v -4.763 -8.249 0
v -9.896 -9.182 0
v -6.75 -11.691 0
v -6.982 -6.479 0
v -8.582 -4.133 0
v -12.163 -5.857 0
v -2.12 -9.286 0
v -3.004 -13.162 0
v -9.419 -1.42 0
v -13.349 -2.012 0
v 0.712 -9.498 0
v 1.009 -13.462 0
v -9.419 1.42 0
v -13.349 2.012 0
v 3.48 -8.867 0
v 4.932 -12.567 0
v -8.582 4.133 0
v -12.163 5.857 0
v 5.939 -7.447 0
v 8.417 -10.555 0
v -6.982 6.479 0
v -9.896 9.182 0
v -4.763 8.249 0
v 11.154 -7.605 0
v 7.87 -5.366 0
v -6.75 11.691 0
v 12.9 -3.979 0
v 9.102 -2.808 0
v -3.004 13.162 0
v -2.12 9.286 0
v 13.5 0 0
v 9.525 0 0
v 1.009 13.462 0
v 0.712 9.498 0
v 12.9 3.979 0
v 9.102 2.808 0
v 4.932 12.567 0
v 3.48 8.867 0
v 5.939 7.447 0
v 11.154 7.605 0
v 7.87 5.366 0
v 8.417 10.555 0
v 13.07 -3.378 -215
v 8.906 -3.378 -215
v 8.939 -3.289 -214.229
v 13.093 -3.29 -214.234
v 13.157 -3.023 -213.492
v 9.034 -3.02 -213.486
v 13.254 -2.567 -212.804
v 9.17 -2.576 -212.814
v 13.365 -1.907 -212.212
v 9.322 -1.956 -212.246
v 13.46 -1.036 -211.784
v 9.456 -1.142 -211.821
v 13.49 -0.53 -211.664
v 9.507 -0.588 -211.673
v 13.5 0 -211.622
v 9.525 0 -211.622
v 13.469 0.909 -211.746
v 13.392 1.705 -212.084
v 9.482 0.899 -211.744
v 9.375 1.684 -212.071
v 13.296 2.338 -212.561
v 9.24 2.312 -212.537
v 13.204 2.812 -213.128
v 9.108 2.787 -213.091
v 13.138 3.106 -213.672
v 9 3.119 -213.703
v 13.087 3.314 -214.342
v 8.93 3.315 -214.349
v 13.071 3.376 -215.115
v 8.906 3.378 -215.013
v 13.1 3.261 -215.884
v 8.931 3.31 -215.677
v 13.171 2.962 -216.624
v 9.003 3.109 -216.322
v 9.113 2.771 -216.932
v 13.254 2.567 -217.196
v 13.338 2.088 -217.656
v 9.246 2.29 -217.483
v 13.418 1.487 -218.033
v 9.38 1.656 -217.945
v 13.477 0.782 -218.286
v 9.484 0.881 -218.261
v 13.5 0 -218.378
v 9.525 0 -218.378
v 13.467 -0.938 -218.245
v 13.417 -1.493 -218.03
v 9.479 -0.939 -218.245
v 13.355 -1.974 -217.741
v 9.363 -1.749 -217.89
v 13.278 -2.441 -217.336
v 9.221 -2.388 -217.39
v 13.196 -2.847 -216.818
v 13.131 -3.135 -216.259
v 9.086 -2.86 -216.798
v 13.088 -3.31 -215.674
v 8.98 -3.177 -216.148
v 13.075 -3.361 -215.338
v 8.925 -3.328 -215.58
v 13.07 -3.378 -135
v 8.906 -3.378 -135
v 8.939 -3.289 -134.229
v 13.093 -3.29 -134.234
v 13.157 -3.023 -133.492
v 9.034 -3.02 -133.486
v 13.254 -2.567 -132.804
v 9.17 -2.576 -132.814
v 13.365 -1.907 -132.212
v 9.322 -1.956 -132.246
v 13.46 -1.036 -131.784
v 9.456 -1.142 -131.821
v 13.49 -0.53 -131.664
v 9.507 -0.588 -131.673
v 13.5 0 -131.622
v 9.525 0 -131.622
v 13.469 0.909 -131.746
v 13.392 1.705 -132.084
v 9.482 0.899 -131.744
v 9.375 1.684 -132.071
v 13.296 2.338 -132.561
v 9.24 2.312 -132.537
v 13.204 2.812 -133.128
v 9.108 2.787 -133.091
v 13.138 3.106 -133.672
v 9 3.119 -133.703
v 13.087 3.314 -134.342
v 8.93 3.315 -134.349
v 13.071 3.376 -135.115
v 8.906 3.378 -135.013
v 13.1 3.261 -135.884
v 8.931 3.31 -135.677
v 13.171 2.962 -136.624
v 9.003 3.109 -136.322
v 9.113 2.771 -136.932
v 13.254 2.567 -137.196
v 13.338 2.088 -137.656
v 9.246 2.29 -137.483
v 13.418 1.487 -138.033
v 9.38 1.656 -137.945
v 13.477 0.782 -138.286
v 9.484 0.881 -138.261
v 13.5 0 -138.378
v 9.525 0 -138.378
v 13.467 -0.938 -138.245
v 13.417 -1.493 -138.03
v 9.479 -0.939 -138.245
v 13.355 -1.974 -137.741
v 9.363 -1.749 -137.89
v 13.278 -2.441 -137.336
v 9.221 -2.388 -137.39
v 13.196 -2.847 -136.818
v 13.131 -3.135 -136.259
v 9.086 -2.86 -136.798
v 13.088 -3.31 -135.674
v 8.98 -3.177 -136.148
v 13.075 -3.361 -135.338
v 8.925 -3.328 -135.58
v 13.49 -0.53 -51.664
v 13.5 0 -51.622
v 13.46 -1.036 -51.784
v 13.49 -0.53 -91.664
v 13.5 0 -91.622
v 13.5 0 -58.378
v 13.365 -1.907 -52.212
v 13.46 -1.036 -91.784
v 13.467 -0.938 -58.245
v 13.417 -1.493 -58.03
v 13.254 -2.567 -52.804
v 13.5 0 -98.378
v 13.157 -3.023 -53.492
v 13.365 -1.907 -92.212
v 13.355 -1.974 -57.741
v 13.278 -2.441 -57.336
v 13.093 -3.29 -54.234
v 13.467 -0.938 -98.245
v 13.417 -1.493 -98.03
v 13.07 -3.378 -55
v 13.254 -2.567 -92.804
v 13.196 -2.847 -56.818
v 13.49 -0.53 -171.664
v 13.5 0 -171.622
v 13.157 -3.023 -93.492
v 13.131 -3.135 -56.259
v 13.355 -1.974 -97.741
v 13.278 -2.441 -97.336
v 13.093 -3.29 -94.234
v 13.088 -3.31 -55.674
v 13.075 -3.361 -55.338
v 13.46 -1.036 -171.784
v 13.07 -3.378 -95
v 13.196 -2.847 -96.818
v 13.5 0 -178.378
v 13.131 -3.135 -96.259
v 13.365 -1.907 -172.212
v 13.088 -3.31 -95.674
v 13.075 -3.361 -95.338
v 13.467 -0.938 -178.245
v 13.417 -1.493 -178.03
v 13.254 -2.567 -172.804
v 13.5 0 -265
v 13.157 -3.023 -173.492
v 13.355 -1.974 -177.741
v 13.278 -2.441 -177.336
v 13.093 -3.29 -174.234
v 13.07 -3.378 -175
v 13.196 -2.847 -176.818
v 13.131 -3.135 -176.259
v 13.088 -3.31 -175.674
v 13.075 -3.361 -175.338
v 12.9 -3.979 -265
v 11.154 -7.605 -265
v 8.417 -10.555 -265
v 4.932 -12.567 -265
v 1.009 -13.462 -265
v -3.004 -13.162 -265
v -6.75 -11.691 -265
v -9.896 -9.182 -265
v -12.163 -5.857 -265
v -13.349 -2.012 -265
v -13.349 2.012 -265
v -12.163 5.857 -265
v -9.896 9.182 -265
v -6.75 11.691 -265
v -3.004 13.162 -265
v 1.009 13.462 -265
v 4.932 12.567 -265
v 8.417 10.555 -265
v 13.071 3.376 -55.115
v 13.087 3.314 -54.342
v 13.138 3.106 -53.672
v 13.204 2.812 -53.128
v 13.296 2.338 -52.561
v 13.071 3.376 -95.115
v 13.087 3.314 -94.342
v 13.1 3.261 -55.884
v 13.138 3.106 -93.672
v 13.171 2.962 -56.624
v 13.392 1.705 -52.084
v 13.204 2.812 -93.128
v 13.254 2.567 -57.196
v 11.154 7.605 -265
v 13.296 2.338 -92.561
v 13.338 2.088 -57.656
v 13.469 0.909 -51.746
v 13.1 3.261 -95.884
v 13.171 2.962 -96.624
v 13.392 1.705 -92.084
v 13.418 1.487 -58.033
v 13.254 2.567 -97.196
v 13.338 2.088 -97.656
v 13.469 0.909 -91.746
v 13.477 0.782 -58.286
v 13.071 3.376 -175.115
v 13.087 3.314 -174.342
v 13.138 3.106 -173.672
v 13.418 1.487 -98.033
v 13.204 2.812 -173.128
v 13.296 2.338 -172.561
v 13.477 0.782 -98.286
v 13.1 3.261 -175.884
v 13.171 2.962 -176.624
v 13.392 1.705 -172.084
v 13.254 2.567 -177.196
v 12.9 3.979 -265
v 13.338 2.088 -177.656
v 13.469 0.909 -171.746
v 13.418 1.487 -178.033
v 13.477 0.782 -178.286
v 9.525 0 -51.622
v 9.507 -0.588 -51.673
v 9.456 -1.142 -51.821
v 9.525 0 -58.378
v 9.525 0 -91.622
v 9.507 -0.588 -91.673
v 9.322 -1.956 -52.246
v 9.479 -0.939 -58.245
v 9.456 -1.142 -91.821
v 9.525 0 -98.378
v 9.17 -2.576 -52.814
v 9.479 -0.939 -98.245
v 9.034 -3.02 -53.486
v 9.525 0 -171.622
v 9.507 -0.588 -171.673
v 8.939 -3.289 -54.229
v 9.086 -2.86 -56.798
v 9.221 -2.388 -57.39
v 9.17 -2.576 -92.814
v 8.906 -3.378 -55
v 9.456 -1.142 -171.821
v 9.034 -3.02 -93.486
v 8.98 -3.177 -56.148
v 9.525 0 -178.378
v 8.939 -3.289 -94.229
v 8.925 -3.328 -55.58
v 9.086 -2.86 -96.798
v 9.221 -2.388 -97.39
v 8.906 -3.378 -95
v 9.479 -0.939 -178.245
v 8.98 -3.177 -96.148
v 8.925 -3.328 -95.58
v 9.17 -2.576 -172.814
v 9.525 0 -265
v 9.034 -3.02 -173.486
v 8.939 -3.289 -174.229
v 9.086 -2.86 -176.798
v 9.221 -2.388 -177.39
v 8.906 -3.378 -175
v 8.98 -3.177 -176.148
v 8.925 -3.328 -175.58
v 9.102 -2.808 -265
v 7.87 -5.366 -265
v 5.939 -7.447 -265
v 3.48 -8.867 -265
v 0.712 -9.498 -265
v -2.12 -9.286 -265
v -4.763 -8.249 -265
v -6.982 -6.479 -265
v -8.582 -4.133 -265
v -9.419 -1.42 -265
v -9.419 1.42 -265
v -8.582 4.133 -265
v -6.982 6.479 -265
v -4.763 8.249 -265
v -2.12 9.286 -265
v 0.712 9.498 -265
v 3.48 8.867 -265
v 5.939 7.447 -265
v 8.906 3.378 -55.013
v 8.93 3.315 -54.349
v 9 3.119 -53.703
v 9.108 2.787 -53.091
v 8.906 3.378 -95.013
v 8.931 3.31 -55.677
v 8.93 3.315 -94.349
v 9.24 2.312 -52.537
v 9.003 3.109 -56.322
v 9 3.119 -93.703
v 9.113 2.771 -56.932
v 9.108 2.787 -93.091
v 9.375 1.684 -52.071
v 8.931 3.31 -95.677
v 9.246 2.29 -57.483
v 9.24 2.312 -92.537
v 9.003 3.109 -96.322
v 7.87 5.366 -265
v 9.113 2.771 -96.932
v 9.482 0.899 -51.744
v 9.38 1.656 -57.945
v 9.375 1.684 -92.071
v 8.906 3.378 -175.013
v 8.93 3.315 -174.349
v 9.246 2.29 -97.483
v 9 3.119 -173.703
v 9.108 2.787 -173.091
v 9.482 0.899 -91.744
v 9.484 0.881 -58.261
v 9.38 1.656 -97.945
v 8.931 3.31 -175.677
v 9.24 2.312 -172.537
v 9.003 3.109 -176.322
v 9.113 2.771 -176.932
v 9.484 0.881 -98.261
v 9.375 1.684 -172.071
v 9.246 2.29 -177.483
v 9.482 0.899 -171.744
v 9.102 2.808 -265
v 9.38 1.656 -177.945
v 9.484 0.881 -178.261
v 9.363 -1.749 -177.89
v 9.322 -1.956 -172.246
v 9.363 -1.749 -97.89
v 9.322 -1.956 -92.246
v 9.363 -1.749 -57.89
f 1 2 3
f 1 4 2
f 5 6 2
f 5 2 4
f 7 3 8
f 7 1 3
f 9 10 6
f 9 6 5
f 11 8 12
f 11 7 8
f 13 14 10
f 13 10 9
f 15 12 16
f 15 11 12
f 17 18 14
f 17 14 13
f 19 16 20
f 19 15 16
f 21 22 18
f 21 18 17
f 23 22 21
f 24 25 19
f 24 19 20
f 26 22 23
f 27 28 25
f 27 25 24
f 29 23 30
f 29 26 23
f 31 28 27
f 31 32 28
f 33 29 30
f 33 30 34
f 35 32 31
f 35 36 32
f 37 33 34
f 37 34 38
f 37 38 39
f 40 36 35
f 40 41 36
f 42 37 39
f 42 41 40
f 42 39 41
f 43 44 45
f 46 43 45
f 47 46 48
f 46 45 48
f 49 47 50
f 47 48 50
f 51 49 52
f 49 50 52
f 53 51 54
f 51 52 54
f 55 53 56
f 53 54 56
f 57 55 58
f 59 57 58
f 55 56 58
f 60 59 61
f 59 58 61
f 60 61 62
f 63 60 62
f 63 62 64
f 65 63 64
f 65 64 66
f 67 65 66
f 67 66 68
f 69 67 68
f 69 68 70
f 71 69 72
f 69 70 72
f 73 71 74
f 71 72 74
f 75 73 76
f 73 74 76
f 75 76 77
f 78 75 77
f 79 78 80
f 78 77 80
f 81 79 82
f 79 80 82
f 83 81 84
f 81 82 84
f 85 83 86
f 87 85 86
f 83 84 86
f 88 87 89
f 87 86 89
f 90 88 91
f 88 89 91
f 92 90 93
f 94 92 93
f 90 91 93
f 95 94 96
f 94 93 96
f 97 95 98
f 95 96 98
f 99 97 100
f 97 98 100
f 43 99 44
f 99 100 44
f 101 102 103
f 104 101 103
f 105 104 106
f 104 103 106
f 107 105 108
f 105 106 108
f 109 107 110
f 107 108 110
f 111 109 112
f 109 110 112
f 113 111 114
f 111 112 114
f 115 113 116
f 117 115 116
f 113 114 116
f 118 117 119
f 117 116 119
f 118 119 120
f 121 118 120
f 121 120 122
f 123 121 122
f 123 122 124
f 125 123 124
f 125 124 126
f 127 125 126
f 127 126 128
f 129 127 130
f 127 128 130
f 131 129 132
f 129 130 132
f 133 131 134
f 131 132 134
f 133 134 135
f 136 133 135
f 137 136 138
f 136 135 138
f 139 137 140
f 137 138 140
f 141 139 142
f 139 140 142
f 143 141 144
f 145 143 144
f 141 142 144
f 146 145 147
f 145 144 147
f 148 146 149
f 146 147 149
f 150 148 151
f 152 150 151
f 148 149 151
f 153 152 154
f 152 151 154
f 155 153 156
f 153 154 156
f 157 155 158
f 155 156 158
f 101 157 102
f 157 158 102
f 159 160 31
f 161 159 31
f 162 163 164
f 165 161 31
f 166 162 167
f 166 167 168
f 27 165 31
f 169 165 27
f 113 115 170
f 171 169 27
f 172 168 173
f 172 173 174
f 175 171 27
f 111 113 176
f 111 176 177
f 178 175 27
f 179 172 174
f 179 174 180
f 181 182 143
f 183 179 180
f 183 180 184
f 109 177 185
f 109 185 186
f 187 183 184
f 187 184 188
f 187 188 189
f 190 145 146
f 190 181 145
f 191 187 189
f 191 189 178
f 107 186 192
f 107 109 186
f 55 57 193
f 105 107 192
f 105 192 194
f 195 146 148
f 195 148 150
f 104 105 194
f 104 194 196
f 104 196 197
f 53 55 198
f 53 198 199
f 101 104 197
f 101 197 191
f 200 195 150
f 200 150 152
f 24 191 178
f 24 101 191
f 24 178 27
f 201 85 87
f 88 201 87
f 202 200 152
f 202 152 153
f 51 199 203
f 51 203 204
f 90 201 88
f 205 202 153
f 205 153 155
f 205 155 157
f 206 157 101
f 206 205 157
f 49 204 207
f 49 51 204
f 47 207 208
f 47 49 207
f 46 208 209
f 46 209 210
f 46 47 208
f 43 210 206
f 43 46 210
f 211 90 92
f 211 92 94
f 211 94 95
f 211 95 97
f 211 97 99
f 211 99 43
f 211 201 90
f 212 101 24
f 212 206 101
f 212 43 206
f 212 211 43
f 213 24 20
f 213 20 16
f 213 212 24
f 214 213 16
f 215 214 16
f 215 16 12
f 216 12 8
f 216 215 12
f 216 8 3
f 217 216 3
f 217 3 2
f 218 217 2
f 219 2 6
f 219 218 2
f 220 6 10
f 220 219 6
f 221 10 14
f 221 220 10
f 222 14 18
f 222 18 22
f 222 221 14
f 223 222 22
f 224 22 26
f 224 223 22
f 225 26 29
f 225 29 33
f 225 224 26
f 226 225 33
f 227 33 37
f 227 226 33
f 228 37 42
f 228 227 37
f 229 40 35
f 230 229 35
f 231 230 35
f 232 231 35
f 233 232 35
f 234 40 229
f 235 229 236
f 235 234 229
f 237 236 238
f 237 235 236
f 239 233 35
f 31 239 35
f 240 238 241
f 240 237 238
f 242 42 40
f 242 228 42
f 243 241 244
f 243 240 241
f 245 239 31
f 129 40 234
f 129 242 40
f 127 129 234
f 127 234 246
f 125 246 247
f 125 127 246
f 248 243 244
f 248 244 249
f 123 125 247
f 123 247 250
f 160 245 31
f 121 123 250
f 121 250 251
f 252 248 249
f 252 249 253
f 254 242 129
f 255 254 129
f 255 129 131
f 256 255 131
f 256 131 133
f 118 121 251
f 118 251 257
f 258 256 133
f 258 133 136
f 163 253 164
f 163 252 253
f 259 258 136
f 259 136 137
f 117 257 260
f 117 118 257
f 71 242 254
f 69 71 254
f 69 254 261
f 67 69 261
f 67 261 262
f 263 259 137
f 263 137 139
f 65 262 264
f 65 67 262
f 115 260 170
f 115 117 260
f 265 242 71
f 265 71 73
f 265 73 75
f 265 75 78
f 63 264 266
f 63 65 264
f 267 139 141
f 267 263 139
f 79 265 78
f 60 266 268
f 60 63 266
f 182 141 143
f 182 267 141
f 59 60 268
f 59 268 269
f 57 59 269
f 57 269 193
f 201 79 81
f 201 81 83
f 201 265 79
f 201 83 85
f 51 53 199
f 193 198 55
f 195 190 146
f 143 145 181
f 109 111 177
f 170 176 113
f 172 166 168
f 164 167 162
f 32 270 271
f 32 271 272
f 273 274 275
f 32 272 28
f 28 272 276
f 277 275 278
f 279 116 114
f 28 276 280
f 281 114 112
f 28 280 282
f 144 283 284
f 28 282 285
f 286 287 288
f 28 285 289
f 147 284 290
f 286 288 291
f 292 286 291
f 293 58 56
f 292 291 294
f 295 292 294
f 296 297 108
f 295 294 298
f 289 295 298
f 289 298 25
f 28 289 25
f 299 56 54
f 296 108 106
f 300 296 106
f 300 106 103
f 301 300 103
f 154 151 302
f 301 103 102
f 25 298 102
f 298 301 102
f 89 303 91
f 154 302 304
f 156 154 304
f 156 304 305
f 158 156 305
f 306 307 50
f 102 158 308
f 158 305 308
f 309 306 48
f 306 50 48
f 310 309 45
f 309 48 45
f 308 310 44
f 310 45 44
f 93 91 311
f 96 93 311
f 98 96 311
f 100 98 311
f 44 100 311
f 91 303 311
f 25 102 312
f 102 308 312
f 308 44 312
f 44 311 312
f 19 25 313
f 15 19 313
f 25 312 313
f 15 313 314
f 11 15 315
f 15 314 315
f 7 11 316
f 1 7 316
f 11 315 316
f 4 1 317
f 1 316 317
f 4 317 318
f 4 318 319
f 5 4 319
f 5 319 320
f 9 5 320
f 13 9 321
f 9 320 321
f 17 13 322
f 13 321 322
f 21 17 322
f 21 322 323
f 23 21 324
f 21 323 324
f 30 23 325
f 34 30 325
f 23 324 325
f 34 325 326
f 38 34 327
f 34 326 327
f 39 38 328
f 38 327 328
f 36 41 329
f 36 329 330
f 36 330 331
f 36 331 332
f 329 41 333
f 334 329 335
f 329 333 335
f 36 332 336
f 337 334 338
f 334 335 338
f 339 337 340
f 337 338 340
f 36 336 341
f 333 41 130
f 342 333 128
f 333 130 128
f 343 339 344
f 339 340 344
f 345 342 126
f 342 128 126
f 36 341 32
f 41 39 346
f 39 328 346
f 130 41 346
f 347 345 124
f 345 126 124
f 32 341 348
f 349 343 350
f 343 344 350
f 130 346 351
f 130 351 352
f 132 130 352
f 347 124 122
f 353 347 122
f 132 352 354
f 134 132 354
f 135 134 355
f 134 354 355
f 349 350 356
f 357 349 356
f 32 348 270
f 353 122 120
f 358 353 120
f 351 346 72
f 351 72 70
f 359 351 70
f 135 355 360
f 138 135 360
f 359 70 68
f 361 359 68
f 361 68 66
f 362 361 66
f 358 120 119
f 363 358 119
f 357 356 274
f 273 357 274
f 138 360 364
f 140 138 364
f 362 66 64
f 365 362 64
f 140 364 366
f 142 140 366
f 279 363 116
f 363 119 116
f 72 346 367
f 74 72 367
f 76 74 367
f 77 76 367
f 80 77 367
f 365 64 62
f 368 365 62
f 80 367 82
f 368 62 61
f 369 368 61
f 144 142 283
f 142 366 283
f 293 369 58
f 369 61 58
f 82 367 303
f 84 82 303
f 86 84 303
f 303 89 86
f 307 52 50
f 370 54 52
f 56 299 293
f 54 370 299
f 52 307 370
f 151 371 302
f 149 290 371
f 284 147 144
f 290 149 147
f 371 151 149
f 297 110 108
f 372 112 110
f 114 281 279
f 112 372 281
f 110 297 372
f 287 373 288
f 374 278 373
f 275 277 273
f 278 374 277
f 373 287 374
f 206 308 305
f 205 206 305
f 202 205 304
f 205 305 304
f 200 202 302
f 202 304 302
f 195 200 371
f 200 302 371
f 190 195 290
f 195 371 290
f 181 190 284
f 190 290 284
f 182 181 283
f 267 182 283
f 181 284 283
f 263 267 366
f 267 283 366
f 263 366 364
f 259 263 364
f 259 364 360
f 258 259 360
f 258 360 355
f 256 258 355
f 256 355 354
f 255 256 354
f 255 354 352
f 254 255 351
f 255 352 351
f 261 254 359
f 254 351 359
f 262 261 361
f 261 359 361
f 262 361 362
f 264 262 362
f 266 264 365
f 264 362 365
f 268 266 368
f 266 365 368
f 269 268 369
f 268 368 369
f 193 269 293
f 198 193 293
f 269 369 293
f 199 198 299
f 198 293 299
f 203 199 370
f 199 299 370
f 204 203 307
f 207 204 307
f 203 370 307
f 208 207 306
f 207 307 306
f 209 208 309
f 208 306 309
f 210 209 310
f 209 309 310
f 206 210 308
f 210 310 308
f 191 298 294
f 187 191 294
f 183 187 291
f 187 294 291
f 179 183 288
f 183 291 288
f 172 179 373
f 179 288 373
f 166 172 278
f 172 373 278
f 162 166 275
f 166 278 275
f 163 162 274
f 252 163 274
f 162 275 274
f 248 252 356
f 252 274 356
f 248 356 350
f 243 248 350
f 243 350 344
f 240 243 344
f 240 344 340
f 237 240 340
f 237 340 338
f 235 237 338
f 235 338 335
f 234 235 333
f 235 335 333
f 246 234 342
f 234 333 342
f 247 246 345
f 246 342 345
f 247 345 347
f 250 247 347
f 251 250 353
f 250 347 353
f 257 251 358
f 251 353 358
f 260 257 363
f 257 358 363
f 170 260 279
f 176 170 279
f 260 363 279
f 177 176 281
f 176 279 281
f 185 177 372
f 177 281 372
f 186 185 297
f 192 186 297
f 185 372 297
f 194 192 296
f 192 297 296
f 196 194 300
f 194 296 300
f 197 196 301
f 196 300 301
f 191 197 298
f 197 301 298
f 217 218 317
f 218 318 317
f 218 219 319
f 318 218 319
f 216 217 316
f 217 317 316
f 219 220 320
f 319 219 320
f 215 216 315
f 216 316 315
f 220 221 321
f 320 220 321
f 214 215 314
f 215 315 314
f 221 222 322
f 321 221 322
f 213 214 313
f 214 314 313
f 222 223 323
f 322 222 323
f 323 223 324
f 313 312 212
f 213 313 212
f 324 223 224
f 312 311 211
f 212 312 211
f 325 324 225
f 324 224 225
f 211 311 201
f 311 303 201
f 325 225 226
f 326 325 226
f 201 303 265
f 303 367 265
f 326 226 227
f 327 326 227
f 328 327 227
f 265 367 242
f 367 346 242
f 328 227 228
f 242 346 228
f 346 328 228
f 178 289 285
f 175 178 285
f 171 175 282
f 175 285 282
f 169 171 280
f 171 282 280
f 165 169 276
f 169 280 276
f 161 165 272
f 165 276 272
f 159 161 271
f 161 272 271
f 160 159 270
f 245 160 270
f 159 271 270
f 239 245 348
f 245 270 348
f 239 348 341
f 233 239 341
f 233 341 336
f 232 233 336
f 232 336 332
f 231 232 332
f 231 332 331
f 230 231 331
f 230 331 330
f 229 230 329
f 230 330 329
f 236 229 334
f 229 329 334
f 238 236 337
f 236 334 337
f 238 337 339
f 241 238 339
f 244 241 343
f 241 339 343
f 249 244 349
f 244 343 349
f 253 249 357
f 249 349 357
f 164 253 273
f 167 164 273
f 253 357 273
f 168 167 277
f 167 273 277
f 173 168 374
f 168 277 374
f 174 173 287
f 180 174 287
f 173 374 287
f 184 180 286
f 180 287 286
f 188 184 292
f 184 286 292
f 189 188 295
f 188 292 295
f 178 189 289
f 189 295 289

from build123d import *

# Parameters (mm, degrees)
SKETCH1_R                   = 13.5
SKETCH1_R_2                 = 9.525
F_1_4_CLEARANCE_HOLE2_D     = 6.7564
F_1_4_CLEARANCE_HOLE2_DEPTH = 13.5


with BuildPart() as part:
    # Sweep1: sweep along a curve in space
    with BuildLine() as sweep1_path:
        Line((0, 0, 0), (0, 0, -265))
    # Sketch1 → Sweep1 (sweep)
    with BuildSketch(Plane.XY):
        Circle(SKETCH1_R)
        Circle(SKETCH1_R_2, mode=Mode.SUBTRACT)
    sweep(path=sweep1_path.line)

    # 1/4 Clearance Hole2
    with Locations(Plane(origin=(13.5, 0, -215), x_dir=(0, 1, 0), z_dir=(1, 0, 0))):
        with Locations((0, 0), (0, 160), (0, 120), (0, 80), (0, 40)):
            Hole(F_1_4_CLEARANCE_HOLE2_D / 2, depth=F_1_4_CLEARANCE_HOLE2_DEPTH)


solid = part.part
